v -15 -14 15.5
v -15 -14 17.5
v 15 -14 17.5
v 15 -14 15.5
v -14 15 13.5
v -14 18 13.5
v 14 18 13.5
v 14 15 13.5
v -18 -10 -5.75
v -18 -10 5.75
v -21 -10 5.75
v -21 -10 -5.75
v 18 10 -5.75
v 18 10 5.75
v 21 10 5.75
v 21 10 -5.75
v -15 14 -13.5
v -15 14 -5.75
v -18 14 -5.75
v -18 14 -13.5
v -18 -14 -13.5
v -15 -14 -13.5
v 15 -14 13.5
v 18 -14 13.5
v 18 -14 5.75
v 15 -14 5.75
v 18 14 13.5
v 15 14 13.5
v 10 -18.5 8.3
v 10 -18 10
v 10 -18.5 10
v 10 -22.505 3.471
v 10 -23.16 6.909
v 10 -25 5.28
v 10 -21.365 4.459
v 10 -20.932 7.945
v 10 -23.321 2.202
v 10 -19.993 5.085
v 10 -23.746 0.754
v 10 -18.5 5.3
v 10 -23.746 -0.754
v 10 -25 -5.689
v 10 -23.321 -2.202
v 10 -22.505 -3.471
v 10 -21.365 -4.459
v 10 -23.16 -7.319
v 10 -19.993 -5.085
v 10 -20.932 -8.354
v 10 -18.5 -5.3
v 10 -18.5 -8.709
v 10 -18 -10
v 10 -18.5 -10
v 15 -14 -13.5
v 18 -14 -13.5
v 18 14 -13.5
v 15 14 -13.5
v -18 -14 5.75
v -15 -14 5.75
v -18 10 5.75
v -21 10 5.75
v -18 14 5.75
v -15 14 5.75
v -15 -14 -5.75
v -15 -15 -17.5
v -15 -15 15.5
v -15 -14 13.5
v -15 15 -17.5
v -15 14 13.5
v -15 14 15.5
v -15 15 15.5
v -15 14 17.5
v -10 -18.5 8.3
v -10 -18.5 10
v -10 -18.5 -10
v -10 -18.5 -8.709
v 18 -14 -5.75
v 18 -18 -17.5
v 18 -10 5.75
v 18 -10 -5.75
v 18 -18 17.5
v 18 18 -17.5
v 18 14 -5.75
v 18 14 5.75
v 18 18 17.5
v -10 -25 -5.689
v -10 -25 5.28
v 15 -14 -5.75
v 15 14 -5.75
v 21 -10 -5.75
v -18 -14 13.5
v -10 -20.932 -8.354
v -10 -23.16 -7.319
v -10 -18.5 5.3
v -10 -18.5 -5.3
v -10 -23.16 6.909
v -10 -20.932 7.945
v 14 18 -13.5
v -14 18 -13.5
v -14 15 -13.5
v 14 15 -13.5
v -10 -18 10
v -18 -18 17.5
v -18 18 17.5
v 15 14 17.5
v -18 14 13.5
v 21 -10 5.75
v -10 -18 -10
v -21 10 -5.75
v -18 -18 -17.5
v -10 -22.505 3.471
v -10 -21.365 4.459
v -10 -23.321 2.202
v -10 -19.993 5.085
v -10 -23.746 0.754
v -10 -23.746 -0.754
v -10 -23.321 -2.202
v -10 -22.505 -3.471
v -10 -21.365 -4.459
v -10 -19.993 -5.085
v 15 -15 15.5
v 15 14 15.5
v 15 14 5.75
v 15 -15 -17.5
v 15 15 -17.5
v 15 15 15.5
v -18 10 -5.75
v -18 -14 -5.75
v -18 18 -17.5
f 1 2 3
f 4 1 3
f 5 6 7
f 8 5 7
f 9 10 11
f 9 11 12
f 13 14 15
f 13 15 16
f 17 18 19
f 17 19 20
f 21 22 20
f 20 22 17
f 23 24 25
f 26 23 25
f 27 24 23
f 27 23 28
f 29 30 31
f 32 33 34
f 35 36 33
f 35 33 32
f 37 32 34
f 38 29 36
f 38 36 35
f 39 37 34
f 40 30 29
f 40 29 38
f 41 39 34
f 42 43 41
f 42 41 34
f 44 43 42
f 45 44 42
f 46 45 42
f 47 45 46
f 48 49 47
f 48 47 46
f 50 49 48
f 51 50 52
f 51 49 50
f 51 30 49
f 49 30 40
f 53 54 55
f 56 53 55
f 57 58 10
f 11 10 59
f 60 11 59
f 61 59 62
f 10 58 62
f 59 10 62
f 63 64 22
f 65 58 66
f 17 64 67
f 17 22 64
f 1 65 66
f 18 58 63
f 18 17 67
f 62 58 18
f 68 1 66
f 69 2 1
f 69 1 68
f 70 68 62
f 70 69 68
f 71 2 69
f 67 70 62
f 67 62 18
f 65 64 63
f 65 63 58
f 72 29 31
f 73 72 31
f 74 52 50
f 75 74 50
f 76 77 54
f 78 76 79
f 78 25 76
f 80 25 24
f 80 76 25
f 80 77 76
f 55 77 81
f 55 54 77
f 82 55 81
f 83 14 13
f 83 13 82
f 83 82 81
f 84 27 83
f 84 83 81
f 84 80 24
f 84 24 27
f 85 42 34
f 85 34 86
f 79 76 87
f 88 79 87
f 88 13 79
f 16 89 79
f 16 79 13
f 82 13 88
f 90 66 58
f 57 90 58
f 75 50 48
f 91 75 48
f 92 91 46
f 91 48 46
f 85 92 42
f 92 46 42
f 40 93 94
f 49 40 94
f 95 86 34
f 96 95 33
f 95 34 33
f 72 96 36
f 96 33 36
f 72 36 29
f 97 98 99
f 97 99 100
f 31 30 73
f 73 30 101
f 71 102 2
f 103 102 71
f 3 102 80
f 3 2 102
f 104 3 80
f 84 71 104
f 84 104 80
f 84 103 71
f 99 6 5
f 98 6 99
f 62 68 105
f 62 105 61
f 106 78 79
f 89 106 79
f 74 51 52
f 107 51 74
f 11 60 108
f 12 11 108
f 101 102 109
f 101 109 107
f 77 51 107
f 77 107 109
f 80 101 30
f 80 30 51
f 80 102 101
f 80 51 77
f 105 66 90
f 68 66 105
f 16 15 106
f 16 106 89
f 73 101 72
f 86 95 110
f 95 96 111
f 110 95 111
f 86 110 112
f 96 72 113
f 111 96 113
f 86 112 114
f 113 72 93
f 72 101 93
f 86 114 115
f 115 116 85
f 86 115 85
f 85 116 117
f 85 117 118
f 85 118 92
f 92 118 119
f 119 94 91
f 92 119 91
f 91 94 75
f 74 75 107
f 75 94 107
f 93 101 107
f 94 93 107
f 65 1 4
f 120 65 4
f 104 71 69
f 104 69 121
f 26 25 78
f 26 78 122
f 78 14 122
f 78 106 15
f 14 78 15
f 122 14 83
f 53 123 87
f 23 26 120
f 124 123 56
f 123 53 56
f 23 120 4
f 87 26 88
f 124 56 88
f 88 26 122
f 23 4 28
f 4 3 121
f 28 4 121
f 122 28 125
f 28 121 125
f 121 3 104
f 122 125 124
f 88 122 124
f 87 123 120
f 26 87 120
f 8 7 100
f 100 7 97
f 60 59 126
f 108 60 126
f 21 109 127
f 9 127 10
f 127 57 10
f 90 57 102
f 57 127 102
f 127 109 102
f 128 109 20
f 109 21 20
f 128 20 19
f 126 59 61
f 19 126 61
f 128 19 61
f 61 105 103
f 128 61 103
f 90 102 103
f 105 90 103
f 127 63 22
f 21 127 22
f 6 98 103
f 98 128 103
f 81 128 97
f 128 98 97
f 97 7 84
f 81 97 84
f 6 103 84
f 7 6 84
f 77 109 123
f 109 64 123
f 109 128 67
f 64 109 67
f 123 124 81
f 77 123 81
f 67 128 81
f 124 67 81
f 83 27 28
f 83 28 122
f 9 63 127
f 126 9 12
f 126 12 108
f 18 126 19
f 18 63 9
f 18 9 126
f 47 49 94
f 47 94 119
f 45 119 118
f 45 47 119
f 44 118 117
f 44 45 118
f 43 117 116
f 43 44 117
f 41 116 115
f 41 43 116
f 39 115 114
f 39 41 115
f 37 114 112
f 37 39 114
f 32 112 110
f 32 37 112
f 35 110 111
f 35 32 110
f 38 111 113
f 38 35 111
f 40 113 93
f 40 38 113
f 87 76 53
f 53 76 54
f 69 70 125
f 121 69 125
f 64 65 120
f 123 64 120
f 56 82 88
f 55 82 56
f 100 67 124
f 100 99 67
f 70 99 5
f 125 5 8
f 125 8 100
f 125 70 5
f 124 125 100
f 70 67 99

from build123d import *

# Parameters (mm, degrees)
SKETCH1_W               = 36
SKETCH1_H               = 36
BOSS_EXTRUDE1_DEPTH     = 17.5
SKETCH2_W               = 30
SKETCH2_H               = 30
CUT_EXTRUDE1_DEPTH      = 15.5
CUT_EXTRUDE1_DEPTH_BACK = 18.5
SKETCH3_W               = 30
SKETCH3_H               = 28
CUT_EXTRUDE3_DEPTH      = 36
SKETCH5_W               = 20
SKETCH5_H               = 20
BOSS_EXTRUDE2_DEPTH     = 7
CUT_EXTRUDE4_DEPTH      = 29
SKETCH7_W               = 11.5
SKETCH7_H               = 20
BOSS_EXTRUDE3_DEPTH     = 3
CUT_EXTRUDE5_DEPTH      = 32
CUT_EXTRUDE6_REACH      = 45
SKETCH10_W              = 28
SKETCH10_H              = 27
SKETCH11_W              = 7.75
SKETCH11_H              = 28
CUT_EXTRUDE7_DEPTH      = 40


with BuildPart() as part:
    # Sketch1 → Boss-Extrude1 (new body, symmetric)
    with BuildSketch(Plane.XY):
        Rectangle(SKETCH1_W, SKETCH1_H)
    extrude(amount=BOSS_EXTRUDE1_DEPTH, both=True)

    # Sketch2 → Cut-Extrude1 (cut, two sides)
    with BuildSketch(Plane.XY) as cut_extrude1_sk:
        Rectangle(SKETCH2_W, SKETCH2_H)
    extrude(amount=CUT_EXTRUDE1_DEPTH, mode=Mode.SUBTRACT)
    extrude(cut_extrude1_sk.sketch, amount=-CUT_EXTRUDE1_DEPTH_BACK, mode=Mode.SUBTRACT)

    # Sketch3 → Cut-Extrude3 (cut, through all)
    with BuildSketch(Plane.XY.offset(17.5)):
        Rectangle(SKETCH3_W, SKETCH3_H)
    extrude(amount=-CUT_EXTRUDE3_DEPTH, mode=Mode.SUBTRACT)

    # Sketch5 → Boss-Extrude2 (add)
    with BuildSketch(Plane(origin=(0, -18, 0), x_dir=(-1, 0, 0), z_dir=(0, -1, 0))):
        Rectangle(SKETCH5_W, SKETCH5_H)
    extrude(amount=BOSS_EXTRUDE2_DEPTH)

    # Sketch6 → Cut-Extrude4 (cut, through all)
    with BuildSketch(Plane(origin=(10, 0, 0), x_dir=(0, 0, -1), z_dir=(1, 0, 0))):
        with BuildLine():
            Line((-5.3, -18.5), (5.3, -18.5))
            ThreePointArc((5.3, -18.5), (0, -23.8), (-5.3, -18.5))
        make_face()
    extrude(amount=-CUT_EXTRUDE4_DEPTH, mode=Mode.SUBTRACT)

    # Sketch7 → Boss-Extrude3 (add)
    with BuildSketch(Plane(origin=(18, 0, 0), x_dir=(0, 0, -1), z_dir=(1, 0, 0))):
        Rectangle(SKETCH7_W, SKETCH7_H)
    boss_extrude3 = extrude(amount=BOSS_EXTRUDE3_DEPTH)

    # Mirror1: Boss-Extrude3 across plane
    add(boss_extrude3.mirror(Plane(origin=(0, 0, 0), x_dir=(0, 0, 1), z_dir=(1, 0, 0))))

    # Sketch9 → Cut-Extrude5 (cut, through all)
    with BuildSketch(Plane(origin=(10, 0, 0), x_dir=(0, 0, -1), z_dir=(1, 0, 0))):
        with BuildLine():
            Line((-8.3, -18.5), (-10, -18.5))
            Line((-10, -18.5), (-10, -28.666019684))
            Line((-10, -28.666019684), (10, -28.666019684))
            Line((10, -28.666019684), (10, -18.5))
            Line((10, -18.5), (8.709331347, -18.5))
            ThreePointArc((8.709331347, -18.5), (0.204665673, -27.004665673), (-8.3, -18.5))
        make_face()
    extrude(amount=-CUT_EXTRUDE5_DEPTH, mode=Mode.SUBTRACT)

    # Sketch10 → Cut-Extrude6 (cut, up to next)
    with BuildSketch(Plane(origin=(0, 18, 0), x_dir=(1, 0, 0), z_dir=(0, 1, 0)), mode=Mode.PRIVATE) as cut_extrude6_sk1:
        Rectangle(SKETCH10_W, SKETCH10_H)
    cut_extrude6_tool1 = extrude(cut_extrude6_sk1.sketch, amount=-CUT_EXTRUDE6_REACH, mode=Mode.PRIVATE) & part.part
    add(cut_extrude6_tool1.solids().sort_by_distance((0, 18, 0))[0], mode=Mode.SUBTRACT)

    # Sketch11 → Cut-Extrude7 (cut, through all)
    with BuildSketch(Plane(origin=(18, 0, 0), x_dir=(0, 0, -1), z_dir=(1, 0, 0))):
        with Locations((-9.625, 0)):
            Rectangle(SKETCH11_W, SKETCH11_H)
        with Locations((9.625, 0)):
            Rectangle(SKETCH11_W, SKETCH11_H)
    extrude(amount=-CUT_EXTRUDE7_DEPTH, mode=Mode.SUBTRACT)


solid = part.part
